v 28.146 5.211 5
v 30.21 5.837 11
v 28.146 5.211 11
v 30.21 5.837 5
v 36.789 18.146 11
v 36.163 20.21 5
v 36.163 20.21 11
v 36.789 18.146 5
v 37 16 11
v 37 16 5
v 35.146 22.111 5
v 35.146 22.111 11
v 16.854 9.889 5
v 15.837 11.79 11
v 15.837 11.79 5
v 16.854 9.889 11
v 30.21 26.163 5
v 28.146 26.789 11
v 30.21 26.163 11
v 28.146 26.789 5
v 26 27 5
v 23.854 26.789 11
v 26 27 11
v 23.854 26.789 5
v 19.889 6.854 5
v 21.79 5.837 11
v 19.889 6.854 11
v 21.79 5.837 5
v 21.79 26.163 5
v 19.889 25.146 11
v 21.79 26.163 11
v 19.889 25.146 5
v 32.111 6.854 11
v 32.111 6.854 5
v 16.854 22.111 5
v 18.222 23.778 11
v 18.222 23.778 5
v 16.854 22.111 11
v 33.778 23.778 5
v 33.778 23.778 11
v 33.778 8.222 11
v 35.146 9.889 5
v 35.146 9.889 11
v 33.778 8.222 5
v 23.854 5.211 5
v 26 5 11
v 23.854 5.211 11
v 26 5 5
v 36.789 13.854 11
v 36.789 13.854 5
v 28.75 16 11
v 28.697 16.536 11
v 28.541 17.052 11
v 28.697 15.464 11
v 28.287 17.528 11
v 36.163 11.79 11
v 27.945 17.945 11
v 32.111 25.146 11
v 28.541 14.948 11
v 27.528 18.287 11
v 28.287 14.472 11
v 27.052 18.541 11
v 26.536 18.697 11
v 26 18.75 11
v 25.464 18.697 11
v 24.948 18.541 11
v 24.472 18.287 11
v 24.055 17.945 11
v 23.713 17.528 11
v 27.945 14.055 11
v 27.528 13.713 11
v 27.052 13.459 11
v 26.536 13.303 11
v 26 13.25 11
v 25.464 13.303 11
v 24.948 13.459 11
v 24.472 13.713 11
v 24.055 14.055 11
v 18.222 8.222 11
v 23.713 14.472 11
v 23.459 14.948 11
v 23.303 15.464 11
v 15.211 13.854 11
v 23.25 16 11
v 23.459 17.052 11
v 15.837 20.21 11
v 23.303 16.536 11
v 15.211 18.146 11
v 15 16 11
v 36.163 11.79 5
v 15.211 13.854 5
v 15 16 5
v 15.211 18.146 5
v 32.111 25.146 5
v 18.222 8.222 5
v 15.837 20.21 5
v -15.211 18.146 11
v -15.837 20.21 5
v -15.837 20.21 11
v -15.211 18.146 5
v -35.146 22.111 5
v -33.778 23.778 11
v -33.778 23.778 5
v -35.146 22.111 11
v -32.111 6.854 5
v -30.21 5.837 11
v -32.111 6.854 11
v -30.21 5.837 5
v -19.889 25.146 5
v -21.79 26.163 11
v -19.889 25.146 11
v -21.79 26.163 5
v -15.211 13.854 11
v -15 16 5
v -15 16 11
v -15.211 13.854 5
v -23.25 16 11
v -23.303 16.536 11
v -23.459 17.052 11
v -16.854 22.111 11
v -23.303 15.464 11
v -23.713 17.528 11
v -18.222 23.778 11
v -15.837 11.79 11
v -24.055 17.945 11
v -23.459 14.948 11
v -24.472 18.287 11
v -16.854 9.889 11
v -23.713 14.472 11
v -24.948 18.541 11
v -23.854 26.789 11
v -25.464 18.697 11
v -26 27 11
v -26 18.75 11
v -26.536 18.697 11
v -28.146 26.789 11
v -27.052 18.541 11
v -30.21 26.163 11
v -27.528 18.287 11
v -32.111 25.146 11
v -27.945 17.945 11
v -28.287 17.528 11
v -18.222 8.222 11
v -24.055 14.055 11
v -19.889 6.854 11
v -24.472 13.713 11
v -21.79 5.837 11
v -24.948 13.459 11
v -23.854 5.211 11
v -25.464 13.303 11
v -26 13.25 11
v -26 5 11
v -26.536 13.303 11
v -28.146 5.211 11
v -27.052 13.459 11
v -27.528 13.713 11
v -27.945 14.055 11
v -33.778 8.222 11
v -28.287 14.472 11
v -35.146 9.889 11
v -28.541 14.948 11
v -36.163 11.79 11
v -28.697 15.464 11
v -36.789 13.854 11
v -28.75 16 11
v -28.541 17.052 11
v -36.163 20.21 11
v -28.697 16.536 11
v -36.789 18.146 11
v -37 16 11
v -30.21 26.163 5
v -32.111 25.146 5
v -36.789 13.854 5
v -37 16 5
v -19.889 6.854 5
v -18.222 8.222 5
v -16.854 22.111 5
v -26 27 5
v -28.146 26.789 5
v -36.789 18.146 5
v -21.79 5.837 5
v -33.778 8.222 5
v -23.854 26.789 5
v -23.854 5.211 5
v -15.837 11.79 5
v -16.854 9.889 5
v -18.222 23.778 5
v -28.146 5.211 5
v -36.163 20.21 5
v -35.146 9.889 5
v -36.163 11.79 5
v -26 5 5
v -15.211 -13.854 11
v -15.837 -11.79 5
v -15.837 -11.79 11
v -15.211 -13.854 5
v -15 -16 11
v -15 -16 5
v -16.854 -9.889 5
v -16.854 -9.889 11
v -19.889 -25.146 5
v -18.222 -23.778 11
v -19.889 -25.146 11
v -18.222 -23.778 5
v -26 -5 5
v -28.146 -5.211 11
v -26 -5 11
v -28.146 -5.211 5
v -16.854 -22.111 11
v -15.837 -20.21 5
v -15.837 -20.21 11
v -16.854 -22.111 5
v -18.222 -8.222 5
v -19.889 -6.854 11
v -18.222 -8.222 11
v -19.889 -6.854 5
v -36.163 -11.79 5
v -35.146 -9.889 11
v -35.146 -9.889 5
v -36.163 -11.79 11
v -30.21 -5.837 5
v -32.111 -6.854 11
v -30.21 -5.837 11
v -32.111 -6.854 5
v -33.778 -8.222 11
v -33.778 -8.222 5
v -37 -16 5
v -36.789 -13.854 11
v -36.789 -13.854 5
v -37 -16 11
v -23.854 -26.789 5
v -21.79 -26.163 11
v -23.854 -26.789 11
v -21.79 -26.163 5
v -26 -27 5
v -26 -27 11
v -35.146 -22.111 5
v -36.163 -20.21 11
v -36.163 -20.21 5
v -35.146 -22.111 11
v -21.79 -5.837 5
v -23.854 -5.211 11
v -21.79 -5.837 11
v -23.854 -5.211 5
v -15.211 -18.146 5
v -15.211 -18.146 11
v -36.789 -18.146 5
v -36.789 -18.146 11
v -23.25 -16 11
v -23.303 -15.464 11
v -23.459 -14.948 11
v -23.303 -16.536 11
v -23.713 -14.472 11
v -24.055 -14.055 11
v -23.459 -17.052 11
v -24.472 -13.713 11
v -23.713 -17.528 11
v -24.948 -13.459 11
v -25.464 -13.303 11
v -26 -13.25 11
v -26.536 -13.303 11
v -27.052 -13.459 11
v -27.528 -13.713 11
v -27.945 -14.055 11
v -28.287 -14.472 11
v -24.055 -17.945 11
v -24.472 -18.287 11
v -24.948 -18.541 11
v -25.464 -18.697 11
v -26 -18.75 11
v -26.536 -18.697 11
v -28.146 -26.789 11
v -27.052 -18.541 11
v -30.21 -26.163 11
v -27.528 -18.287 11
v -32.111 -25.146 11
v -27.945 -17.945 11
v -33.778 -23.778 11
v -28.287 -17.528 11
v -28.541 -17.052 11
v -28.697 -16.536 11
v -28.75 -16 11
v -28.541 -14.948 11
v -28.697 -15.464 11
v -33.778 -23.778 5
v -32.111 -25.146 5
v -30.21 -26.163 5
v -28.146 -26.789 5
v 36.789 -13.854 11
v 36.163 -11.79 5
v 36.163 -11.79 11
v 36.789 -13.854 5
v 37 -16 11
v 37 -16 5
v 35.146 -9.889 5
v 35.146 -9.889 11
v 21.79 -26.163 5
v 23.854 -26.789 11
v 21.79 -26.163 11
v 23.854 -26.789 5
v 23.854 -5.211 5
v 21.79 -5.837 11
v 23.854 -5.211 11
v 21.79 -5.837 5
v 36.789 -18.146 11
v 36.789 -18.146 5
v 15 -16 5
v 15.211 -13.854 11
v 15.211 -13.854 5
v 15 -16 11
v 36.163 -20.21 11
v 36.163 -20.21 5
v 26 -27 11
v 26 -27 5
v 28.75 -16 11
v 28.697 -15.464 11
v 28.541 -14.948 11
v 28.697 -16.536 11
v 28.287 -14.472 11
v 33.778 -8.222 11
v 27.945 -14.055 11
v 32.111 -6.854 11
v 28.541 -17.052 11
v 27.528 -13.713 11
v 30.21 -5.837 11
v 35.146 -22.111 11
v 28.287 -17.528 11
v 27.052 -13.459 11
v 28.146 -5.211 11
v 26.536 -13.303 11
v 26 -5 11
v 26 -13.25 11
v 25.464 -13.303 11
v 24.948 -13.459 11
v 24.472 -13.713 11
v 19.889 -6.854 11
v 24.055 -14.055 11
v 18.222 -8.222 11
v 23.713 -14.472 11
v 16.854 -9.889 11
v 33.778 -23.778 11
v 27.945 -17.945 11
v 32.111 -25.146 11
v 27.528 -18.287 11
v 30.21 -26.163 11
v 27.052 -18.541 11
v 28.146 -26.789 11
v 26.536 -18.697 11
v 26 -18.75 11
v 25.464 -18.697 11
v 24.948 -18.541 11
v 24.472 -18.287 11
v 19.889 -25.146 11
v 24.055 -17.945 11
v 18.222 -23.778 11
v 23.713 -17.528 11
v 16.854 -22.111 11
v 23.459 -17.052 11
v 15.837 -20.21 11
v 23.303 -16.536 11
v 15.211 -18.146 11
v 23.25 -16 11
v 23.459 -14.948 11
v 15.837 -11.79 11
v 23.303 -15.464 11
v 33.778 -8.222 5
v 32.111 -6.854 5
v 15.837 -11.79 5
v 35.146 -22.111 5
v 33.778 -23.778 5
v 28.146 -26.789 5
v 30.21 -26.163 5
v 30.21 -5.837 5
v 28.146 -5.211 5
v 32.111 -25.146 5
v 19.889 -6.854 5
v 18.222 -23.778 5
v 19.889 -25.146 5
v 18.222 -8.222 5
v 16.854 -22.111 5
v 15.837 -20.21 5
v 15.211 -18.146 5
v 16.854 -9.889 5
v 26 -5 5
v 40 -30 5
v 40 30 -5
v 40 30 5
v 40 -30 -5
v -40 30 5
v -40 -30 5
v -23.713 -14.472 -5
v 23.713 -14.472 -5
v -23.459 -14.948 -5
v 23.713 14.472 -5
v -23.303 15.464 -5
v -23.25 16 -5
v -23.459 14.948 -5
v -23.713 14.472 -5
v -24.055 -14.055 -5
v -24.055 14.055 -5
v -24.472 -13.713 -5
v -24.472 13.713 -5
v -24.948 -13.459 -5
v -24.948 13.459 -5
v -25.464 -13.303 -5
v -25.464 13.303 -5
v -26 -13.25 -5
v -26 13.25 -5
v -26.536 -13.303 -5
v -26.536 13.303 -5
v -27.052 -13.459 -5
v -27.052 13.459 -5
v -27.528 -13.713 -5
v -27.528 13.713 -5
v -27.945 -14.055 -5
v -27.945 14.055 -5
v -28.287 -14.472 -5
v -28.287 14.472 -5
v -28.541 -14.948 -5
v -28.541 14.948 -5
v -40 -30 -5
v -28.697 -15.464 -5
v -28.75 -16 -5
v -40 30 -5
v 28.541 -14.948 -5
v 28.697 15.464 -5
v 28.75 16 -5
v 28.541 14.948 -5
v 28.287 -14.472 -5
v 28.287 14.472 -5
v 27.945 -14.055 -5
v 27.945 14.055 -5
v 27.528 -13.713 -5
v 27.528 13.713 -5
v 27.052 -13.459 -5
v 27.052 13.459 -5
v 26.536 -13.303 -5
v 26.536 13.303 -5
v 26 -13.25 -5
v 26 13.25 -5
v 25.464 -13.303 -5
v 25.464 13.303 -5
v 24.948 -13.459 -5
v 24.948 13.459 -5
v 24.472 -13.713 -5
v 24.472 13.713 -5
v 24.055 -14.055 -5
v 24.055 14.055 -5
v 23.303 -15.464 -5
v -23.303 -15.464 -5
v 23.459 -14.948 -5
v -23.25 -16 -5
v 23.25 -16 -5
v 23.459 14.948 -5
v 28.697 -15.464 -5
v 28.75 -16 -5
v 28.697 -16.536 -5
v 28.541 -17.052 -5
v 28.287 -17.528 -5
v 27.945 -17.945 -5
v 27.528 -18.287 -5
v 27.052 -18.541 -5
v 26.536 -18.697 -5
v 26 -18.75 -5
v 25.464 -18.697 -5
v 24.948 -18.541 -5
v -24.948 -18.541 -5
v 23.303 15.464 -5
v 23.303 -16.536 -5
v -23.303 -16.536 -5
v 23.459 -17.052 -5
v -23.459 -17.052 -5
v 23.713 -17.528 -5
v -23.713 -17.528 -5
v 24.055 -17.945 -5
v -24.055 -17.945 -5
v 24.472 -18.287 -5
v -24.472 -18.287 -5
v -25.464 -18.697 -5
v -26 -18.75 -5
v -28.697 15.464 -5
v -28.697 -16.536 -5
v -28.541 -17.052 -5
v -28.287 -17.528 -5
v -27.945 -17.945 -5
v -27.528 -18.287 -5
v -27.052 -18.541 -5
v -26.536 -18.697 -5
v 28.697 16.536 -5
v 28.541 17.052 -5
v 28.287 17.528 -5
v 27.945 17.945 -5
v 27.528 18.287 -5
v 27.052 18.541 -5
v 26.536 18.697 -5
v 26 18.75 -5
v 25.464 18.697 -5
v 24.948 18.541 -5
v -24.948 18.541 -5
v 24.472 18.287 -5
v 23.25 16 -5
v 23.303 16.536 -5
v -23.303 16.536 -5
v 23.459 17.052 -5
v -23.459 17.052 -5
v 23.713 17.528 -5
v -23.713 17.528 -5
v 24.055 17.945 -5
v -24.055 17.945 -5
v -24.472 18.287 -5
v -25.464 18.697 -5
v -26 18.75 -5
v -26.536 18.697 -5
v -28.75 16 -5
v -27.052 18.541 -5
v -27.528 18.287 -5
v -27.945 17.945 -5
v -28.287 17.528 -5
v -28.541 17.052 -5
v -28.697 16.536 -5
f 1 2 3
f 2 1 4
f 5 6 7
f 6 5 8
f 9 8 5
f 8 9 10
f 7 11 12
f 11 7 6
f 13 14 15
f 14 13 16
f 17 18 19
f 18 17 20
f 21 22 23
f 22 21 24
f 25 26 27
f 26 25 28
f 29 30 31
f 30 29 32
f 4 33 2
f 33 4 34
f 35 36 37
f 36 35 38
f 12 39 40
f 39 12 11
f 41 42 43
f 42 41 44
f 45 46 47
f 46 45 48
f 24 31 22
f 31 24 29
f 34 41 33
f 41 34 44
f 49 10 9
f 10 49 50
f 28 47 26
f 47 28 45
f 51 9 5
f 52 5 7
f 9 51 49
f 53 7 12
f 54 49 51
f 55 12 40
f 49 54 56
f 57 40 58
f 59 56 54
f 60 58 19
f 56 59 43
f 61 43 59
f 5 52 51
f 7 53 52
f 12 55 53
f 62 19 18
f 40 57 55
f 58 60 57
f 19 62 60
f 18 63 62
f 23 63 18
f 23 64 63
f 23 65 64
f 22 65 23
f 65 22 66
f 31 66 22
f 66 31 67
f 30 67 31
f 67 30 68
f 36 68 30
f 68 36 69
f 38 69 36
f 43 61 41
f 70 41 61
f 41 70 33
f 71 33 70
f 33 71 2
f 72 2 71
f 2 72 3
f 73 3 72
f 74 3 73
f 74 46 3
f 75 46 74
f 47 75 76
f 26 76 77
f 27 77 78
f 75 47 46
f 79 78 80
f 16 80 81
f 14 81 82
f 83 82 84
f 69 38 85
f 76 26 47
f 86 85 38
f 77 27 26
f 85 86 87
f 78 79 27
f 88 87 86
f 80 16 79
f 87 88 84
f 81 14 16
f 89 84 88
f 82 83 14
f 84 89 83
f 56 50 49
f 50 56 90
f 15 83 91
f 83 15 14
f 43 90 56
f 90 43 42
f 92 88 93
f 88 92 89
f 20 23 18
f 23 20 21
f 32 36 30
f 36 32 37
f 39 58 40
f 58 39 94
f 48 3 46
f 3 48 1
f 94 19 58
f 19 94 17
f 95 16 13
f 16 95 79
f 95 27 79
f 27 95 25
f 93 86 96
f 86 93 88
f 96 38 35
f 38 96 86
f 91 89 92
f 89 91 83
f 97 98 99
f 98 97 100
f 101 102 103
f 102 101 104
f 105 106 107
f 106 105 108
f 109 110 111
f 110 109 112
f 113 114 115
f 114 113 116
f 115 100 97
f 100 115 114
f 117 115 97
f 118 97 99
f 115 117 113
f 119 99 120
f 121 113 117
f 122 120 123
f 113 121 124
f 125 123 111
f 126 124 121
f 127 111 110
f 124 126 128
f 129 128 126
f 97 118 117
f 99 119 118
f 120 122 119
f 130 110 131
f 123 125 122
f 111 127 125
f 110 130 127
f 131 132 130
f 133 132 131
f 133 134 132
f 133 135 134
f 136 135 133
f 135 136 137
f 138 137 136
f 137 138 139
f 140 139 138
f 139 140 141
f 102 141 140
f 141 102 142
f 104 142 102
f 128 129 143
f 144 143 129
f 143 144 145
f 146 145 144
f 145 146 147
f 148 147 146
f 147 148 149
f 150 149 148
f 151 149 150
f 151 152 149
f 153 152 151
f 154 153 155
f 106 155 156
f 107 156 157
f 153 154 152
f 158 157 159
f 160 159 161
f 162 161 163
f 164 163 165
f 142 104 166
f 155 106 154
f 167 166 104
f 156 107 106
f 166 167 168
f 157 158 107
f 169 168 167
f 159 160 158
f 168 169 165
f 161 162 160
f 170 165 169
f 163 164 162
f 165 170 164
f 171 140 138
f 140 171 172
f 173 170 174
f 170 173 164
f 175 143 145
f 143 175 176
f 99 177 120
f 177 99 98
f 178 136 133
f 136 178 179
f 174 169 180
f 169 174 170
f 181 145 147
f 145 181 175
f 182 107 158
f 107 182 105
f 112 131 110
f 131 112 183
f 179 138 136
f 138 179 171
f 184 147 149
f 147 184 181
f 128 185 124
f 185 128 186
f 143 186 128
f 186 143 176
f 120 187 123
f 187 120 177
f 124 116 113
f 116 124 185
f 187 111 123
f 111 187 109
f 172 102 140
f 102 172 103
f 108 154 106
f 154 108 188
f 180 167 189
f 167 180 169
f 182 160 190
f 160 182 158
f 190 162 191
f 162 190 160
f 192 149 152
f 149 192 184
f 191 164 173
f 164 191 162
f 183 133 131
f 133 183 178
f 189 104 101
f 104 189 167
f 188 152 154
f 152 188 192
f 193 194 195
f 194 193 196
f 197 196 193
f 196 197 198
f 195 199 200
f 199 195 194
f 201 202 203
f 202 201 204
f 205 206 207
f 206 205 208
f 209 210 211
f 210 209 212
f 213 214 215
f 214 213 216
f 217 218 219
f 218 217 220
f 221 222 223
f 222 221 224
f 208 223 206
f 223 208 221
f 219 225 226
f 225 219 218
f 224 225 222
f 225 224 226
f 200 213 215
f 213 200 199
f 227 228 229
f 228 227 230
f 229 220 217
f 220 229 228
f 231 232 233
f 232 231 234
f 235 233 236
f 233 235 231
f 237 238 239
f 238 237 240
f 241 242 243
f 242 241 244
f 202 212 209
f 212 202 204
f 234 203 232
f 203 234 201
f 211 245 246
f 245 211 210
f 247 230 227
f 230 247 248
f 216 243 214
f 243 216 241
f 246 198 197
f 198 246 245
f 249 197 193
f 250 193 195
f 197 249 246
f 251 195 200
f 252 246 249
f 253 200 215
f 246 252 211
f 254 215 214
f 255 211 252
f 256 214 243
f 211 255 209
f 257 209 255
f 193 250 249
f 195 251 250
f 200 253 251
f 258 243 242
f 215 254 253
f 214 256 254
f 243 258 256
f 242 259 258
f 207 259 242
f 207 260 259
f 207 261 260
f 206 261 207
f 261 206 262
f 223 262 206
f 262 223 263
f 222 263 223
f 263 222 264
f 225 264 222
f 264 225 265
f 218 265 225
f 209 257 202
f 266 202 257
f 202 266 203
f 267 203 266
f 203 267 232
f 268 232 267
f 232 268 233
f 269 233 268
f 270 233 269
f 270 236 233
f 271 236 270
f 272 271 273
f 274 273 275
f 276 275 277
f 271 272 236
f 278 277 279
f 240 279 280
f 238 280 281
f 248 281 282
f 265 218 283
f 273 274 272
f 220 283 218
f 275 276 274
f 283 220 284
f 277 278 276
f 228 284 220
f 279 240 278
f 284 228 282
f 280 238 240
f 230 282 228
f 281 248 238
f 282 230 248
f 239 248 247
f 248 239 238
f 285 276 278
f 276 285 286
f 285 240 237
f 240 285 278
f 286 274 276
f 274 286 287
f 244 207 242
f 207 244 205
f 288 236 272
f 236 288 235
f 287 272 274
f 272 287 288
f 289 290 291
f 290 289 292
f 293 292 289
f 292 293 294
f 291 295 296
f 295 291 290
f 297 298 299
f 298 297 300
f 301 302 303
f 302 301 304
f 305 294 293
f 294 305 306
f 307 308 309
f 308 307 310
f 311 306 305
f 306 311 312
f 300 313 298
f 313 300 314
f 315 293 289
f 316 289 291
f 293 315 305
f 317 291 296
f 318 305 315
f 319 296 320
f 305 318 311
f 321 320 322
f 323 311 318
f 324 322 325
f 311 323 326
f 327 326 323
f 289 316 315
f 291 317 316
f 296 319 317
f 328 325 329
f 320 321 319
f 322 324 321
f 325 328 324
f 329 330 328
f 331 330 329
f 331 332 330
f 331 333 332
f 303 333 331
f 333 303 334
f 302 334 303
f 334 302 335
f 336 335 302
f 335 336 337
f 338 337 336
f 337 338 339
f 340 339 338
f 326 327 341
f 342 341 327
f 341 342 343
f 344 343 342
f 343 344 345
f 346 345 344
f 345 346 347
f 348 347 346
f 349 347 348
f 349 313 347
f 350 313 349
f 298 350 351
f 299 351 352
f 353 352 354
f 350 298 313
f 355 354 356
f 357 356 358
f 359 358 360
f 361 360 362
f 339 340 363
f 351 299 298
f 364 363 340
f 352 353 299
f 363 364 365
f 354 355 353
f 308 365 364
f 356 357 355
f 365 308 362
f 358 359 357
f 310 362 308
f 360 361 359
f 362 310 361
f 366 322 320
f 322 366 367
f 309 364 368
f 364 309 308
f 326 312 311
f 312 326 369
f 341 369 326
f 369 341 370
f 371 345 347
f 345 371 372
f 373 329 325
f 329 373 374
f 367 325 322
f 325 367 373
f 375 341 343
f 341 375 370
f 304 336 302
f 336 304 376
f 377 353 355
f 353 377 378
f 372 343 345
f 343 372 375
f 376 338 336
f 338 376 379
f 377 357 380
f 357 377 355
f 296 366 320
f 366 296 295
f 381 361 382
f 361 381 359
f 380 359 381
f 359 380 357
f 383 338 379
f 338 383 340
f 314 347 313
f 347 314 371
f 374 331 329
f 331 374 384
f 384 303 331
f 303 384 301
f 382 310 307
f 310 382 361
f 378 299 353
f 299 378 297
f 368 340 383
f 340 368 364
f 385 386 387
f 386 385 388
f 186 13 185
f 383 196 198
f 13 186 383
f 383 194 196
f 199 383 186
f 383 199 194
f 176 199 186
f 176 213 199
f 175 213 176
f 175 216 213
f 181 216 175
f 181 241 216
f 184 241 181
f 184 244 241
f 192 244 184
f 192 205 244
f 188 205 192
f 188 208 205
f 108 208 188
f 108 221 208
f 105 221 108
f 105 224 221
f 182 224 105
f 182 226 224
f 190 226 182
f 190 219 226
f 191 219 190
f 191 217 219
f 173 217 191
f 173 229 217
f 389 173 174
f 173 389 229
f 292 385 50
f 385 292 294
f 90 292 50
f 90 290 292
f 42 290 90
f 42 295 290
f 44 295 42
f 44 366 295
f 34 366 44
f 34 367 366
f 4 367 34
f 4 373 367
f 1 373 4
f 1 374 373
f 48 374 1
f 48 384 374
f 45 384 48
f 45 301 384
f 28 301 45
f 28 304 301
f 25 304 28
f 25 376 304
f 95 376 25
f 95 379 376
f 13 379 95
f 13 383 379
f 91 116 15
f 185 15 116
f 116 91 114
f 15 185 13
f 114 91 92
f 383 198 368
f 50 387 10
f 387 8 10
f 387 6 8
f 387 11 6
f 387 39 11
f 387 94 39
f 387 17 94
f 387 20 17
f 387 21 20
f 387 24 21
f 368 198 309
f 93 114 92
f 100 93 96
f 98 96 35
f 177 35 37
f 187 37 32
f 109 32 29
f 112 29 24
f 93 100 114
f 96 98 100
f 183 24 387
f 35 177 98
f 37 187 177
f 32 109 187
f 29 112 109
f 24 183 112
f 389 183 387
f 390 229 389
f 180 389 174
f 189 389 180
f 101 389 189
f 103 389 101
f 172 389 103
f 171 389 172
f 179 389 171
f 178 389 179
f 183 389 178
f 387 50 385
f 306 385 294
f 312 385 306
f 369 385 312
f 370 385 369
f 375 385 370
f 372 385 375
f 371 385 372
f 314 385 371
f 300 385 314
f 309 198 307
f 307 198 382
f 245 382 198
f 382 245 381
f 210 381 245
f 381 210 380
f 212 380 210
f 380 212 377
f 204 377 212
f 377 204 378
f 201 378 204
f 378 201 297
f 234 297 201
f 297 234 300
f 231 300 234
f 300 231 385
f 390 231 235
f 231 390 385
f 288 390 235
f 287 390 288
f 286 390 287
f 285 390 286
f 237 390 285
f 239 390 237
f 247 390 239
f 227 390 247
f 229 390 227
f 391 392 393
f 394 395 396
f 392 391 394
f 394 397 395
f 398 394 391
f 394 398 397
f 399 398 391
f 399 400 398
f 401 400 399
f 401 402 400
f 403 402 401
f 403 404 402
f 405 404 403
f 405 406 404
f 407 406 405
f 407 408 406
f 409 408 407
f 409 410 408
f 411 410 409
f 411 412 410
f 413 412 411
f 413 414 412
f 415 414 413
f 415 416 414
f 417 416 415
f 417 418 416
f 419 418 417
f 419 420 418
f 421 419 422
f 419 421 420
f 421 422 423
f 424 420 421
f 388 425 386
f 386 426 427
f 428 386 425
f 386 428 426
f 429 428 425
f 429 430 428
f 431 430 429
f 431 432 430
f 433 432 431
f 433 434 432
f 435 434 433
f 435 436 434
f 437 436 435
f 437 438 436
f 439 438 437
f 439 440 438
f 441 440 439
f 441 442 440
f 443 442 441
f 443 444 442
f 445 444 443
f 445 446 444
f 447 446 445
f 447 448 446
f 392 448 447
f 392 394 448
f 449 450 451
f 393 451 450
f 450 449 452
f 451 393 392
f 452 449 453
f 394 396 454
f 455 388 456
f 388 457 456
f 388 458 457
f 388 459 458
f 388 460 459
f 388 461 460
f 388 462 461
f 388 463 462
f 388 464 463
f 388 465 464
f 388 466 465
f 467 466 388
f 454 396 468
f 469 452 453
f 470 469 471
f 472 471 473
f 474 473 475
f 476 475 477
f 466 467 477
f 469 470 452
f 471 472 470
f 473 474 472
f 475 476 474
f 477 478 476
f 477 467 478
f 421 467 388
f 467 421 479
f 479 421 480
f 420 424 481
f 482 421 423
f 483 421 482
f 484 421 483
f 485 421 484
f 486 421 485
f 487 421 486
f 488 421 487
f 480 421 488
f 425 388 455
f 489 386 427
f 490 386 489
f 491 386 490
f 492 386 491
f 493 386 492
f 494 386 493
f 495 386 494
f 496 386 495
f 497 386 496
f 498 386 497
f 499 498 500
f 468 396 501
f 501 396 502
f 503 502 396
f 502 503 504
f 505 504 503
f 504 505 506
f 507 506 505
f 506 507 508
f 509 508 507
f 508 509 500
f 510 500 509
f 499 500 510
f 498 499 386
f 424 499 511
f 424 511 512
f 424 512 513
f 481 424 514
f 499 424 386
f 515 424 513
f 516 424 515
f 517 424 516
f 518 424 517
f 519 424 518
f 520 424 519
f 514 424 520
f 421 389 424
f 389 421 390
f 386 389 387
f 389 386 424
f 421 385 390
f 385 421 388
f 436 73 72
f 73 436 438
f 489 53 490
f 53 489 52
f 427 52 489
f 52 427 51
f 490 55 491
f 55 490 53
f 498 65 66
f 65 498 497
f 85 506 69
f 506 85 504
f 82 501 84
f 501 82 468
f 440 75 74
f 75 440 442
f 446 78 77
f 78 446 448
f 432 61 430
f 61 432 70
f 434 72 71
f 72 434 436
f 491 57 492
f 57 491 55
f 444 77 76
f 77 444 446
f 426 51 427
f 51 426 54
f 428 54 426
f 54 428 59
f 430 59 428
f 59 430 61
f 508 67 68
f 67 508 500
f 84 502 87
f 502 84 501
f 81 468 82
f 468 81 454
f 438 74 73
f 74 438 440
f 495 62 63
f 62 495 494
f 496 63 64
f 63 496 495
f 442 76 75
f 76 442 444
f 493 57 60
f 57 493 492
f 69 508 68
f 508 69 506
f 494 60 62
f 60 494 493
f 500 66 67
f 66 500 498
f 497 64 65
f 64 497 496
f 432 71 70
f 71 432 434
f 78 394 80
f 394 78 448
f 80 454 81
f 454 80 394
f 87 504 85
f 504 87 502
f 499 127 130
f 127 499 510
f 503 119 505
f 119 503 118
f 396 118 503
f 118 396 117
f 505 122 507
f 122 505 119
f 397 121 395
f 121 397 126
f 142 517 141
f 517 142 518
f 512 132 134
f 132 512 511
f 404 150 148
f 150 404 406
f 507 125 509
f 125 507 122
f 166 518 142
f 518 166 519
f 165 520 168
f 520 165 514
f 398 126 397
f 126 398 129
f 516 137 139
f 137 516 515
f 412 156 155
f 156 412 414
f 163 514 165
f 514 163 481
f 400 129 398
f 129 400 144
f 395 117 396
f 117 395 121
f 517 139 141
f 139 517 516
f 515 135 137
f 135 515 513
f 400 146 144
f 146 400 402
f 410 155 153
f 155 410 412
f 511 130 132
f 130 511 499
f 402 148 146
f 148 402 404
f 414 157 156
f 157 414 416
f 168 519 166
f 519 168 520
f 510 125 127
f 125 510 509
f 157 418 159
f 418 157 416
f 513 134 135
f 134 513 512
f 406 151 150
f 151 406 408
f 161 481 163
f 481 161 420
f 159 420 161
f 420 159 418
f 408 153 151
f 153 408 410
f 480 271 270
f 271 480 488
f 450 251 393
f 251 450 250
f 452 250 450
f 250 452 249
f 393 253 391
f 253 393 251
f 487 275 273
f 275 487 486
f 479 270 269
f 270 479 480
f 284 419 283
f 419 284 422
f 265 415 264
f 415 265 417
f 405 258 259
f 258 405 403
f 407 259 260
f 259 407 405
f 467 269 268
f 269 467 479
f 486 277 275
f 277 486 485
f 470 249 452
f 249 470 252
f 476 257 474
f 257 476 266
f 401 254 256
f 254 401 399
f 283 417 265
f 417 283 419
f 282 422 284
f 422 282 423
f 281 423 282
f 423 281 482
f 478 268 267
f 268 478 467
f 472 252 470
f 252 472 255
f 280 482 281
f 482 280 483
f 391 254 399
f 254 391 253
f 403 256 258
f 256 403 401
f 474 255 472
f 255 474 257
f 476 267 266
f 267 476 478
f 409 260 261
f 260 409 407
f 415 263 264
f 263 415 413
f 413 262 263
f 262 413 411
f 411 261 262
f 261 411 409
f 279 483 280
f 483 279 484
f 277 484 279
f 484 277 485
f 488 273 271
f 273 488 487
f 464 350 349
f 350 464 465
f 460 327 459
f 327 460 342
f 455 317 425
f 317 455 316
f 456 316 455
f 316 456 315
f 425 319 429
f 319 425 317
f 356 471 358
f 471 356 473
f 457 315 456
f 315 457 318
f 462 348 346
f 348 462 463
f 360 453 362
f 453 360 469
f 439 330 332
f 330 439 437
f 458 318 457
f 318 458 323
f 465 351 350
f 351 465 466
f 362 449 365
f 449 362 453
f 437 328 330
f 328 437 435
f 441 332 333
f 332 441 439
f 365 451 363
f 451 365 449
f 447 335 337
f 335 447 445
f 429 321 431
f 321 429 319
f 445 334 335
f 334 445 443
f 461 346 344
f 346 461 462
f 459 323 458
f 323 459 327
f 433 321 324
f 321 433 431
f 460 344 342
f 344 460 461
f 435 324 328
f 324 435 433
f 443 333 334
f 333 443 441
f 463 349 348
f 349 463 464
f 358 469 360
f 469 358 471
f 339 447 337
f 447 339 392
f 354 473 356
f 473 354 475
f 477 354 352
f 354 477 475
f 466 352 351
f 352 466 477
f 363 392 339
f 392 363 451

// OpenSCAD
$fn = 32;

// ----------------------------------------------------------------------
// Anchor pads 80 x 60 x 16
// four corner bosses with anchor holes
// ----------------------------------------------------------------------

// --- parameters (mm) ---
plate = [80, 60, 10];  // base plate size (x, y, z)
pads = 4;              // boss count, one per corner
edge = 14;             // boss centre offset from the plate edge
boss_d = 22;           // boss diameter
boss_h = 6;            // boss height above the base plate
hole_d = 5.5;          // hole diameter

// --- derived feature positions (mm) ---
height = plate[2] + boss_h;      // = 16   overall height of the part
corner_x = plate[0] / 2 - edge;  // = 26   boss centre X
corner_y = plate[1] / 2 - edge;  // = 16   boss centre Y
feature_centers = [
  [corner_x, corner_y],
  [-corner_x, corner_y],
  [-corner_x, -corner_y],
  [corner_x, -corner_y]
];   // boss centres, anchor holes are drilled there

// base plate, four bosses standing on it, anchor holes all the way through
difference() {
  union() {
    cube(plate, center = true);
    for (centre = feature_centers)
      translate([centre[0], centre[1], plate[2] / 2 - 1])
        cylinder(d = boss_d, h = boss_h + 1);
  }
  for (centre = feature_centers)
    translate([centre[0], centre[1], -height])
      cylinder(d = hole_d, h = 2 * height + 2);  // through boss and plate
}
